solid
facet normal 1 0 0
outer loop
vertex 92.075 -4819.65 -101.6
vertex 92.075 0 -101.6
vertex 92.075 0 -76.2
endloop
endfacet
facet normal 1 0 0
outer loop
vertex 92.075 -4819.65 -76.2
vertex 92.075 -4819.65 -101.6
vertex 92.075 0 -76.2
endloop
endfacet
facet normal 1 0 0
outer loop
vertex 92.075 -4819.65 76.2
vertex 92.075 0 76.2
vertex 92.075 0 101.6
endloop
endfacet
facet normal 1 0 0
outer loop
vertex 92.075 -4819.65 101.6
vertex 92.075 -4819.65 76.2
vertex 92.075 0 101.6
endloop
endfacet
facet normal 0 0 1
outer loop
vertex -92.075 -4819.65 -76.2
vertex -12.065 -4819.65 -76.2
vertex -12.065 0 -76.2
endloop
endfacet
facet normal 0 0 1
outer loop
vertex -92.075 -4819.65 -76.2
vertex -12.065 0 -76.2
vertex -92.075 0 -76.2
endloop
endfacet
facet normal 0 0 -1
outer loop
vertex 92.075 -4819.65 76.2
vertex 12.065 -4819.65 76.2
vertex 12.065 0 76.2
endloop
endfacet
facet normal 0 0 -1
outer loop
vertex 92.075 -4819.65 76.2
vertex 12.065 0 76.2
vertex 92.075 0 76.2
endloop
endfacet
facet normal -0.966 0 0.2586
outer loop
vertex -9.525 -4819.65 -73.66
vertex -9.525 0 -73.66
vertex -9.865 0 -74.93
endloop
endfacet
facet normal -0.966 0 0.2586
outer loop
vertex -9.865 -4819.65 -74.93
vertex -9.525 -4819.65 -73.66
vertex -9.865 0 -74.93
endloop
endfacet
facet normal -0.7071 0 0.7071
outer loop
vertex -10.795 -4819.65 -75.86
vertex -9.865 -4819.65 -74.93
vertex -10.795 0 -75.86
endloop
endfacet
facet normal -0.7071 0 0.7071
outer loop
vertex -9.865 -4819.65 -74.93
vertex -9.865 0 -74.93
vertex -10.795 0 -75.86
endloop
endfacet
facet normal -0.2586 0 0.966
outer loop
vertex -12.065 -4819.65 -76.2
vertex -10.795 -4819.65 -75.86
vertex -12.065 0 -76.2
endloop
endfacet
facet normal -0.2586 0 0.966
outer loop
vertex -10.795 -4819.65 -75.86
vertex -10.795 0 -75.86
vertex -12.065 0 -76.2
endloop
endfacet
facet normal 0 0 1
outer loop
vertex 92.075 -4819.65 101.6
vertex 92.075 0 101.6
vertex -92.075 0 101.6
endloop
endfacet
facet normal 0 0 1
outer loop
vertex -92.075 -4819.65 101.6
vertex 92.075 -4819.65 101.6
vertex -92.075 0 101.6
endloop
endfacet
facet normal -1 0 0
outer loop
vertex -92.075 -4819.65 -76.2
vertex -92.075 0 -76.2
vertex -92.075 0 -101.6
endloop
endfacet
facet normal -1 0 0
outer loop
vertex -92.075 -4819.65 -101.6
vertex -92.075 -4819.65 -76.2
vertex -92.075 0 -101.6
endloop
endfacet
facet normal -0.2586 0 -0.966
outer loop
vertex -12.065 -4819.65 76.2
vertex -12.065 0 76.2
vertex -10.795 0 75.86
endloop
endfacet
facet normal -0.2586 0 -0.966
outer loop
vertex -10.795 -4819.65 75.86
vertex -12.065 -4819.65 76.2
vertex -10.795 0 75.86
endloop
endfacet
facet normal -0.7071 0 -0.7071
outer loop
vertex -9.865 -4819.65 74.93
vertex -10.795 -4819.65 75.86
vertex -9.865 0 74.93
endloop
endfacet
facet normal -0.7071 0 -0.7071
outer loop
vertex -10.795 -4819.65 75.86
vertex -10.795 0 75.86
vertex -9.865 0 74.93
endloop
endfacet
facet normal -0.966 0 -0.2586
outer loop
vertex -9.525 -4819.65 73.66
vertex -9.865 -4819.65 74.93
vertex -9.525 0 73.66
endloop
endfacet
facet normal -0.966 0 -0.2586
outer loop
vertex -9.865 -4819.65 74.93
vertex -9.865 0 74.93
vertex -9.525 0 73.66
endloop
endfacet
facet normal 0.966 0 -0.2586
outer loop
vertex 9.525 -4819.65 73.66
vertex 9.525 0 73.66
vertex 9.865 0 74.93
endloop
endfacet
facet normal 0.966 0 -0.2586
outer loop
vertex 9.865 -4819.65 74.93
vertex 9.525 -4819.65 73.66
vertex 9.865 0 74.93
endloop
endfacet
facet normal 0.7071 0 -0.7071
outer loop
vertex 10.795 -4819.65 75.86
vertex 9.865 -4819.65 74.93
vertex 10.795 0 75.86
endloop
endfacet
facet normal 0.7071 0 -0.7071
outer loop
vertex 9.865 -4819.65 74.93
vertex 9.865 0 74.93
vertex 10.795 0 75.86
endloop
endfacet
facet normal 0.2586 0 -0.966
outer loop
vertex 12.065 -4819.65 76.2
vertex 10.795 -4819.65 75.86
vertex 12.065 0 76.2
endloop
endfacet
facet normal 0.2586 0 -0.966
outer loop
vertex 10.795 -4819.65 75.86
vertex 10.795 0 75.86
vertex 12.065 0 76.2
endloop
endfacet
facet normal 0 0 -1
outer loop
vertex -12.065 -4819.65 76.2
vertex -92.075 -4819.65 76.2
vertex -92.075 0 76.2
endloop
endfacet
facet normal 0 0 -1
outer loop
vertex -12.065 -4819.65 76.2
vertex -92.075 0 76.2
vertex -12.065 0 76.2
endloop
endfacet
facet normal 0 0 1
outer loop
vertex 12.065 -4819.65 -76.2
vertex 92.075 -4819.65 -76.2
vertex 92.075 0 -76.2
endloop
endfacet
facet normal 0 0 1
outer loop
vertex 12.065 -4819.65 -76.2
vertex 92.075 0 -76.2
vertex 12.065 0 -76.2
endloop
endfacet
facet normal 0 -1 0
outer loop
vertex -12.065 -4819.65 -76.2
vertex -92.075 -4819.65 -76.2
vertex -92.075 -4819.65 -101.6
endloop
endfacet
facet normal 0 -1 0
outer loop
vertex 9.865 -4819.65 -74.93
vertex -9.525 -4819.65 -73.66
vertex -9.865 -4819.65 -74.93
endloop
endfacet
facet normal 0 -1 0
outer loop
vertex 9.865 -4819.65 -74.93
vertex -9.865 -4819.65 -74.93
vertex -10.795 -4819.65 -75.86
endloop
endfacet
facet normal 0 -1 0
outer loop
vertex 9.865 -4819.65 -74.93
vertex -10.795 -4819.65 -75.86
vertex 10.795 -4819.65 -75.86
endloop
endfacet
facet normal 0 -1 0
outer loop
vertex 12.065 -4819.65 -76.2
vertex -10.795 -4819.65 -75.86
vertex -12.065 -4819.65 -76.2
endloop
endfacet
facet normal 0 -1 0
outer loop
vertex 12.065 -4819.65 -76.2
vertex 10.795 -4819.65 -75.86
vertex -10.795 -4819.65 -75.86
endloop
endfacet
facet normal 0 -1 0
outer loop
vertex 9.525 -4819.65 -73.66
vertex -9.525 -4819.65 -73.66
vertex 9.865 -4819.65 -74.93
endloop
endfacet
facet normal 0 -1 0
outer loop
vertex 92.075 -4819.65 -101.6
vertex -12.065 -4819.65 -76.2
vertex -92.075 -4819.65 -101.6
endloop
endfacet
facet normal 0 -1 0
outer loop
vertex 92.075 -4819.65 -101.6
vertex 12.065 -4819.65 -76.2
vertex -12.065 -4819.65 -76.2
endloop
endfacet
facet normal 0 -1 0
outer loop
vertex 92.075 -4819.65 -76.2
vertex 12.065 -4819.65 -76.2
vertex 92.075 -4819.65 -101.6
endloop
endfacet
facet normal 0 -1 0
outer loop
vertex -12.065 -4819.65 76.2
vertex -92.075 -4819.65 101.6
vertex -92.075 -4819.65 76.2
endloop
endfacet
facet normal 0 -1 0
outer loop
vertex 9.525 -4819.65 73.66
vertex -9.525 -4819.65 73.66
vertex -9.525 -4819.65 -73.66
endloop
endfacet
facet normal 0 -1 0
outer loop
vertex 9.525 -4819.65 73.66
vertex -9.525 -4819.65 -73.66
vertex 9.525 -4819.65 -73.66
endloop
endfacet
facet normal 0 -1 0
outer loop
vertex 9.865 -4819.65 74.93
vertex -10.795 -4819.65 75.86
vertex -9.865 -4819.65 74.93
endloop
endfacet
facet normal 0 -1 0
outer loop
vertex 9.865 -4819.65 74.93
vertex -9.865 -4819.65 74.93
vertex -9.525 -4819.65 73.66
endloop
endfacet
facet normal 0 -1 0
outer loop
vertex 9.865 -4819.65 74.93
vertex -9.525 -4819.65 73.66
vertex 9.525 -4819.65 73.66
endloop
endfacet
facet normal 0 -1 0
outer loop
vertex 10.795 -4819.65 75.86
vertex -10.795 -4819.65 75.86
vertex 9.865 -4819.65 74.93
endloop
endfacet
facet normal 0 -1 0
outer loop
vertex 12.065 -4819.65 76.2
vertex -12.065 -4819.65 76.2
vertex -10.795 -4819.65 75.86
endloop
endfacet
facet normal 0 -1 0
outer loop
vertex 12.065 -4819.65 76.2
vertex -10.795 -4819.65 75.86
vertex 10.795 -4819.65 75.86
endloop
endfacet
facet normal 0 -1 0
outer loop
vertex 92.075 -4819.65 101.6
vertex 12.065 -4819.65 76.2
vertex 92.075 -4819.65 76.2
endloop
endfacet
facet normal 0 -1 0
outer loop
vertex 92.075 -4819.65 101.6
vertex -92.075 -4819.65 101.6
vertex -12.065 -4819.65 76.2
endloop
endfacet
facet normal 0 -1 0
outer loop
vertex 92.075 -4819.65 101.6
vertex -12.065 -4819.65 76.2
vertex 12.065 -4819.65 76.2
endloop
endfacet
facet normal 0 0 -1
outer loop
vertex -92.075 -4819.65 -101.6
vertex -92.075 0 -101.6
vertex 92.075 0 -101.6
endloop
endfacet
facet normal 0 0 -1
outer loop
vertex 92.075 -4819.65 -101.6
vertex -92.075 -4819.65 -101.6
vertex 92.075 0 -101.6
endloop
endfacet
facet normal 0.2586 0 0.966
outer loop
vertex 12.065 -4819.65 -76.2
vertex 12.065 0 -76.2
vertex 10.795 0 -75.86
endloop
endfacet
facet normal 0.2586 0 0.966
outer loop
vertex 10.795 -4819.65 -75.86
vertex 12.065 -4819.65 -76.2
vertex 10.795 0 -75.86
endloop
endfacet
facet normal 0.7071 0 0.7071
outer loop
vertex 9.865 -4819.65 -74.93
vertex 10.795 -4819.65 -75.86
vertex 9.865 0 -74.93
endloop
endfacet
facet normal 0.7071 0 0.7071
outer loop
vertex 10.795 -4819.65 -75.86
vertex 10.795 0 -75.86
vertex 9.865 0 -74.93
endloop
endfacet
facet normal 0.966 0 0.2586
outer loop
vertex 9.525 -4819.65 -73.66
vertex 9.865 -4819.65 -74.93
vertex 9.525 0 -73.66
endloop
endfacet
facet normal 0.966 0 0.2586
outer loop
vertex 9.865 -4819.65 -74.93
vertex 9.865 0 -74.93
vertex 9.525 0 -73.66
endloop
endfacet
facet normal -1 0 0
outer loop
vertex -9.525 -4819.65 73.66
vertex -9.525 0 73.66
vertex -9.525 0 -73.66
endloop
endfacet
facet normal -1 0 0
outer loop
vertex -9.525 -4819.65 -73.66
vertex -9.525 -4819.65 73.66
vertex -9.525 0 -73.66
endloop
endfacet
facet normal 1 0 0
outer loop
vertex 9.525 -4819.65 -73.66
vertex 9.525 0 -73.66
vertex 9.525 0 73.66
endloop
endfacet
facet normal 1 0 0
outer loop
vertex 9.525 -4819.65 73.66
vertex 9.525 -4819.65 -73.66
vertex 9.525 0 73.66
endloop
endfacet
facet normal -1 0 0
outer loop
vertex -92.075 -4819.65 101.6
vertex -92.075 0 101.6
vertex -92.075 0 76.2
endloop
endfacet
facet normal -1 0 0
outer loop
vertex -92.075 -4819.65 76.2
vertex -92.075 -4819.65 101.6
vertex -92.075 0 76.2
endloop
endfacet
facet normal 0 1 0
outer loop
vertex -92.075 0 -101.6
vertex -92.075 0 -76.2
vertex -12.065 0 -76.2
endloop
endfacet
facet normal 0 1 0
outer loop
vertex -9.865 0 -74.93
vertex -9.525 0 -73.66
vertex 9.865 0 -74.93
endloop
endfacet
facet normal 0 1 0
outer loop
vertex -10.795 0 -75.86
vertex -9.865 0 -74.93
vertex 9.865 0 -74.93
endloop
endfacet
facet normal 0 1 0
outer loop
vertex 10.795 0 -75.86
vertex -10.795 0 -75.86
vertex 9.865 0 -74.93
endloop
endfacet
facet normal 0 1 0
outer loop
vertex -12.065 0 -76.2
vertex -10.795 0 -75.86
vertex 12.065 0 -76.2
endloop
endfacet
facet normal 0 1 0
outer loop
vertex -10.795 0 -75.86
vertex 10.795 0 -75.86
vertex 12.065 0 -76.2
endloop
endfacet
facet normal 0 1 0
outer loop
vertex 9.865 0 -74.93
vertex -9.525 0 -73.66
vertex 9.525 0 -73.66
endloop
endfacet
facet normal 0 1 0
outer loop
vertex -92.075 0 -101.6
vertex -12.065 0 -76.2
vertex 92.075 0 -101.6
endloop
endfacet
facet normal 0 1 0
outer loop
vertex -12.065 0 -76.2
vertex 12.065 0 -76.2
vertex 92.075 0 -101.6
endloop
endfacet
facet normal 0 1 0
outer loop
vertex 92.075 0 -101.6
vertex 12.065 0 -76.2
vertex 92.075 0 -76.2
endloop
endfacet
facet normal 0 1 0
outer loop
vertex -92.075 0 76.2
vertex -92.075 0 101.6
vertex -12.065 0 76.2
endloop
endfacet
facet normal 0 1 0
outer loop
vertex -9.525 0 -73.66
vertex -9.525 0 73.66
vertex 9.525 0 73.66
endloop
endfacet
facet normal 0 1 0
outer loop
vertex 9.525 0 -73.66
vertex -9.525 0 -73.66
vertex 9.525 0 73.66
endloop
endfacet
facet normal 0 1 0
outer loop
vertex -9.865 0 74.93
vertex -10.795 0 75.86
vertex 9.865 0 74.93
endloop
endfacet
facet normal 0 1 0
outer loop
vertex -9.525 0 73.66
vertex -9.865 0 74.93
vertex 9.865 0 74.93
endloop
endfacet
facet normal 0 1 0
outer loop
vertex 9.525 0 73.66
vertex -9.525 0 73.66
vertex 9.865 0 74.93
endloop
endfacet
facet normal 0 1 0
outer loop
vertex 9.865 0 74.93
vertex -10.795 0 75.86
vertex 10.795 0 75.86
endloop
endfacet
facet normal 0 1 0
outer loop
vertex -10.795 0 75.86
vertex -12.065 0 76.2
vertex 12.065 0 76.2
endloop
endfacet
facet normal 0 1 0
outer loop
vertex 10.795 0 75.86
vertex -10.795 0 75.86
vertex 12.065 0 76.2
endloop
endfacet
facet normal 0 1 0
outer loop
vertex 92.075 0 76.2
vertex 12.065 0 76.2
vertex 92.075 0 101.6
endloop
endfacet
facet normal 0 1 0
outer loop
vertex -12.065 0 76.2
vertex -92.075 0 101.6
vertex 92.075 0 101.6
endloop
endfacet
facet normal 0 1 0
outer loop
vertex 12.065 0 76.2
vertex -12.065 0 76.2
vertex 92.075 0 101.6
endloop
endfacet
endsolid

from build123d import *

# Parameters (mm, degrees)
F1_DEPTH = 4819.65


with BuildPart() as f1:
    # F0 (on Front) → F1 (new body)
    with BuildSketch(Plane.XZ):
        with BuildLine():
            Line((92.075, -101.6), (92.075, -76.2))
            Line((92.075, -76.2), (12.065, -76.2))
            ThreePointArc((12.065, -76.2), (10.268949, -75.456051), (9.525, -73.66))
            Line((9.525, -73.66), (9.525, 73.66))
            ThreePointArc((9.525, 73.66), (10.268949, 75.456051), (12.065, 76.2))
            Line((12.065, 76.2), (92.075, 76.2))
            Line((92.075, 76.2), (92.075, 101.6))
            Line((92.075, 101.6), (-92.075, 101.6))
            Line((-92.075, 101.6), (-92.075, 76.2))
            Line((-92.075, 76.2), (-12.065, 76.2))
            ThreePointArc((-12.065, 76.2), (-10.268949, 75.456051), (-9.525, 73.66))
            Line((-9.525, 73.66), (-9.525, -73.66))
            ThreePointArc((-9.525, -73.66), (-10.268949, -75.456051), (-12.065, -76.2))
            Line((-12.065, -76.2), (-92.075, -76.2))
            Line((-92.075, -76.2), (-92.075, -101.6))
            Line((-92.075, -101.6), (92.075, -101.6))
        make_face()
    extrude(amount=F1_DEPTH)


solid = f1.part
